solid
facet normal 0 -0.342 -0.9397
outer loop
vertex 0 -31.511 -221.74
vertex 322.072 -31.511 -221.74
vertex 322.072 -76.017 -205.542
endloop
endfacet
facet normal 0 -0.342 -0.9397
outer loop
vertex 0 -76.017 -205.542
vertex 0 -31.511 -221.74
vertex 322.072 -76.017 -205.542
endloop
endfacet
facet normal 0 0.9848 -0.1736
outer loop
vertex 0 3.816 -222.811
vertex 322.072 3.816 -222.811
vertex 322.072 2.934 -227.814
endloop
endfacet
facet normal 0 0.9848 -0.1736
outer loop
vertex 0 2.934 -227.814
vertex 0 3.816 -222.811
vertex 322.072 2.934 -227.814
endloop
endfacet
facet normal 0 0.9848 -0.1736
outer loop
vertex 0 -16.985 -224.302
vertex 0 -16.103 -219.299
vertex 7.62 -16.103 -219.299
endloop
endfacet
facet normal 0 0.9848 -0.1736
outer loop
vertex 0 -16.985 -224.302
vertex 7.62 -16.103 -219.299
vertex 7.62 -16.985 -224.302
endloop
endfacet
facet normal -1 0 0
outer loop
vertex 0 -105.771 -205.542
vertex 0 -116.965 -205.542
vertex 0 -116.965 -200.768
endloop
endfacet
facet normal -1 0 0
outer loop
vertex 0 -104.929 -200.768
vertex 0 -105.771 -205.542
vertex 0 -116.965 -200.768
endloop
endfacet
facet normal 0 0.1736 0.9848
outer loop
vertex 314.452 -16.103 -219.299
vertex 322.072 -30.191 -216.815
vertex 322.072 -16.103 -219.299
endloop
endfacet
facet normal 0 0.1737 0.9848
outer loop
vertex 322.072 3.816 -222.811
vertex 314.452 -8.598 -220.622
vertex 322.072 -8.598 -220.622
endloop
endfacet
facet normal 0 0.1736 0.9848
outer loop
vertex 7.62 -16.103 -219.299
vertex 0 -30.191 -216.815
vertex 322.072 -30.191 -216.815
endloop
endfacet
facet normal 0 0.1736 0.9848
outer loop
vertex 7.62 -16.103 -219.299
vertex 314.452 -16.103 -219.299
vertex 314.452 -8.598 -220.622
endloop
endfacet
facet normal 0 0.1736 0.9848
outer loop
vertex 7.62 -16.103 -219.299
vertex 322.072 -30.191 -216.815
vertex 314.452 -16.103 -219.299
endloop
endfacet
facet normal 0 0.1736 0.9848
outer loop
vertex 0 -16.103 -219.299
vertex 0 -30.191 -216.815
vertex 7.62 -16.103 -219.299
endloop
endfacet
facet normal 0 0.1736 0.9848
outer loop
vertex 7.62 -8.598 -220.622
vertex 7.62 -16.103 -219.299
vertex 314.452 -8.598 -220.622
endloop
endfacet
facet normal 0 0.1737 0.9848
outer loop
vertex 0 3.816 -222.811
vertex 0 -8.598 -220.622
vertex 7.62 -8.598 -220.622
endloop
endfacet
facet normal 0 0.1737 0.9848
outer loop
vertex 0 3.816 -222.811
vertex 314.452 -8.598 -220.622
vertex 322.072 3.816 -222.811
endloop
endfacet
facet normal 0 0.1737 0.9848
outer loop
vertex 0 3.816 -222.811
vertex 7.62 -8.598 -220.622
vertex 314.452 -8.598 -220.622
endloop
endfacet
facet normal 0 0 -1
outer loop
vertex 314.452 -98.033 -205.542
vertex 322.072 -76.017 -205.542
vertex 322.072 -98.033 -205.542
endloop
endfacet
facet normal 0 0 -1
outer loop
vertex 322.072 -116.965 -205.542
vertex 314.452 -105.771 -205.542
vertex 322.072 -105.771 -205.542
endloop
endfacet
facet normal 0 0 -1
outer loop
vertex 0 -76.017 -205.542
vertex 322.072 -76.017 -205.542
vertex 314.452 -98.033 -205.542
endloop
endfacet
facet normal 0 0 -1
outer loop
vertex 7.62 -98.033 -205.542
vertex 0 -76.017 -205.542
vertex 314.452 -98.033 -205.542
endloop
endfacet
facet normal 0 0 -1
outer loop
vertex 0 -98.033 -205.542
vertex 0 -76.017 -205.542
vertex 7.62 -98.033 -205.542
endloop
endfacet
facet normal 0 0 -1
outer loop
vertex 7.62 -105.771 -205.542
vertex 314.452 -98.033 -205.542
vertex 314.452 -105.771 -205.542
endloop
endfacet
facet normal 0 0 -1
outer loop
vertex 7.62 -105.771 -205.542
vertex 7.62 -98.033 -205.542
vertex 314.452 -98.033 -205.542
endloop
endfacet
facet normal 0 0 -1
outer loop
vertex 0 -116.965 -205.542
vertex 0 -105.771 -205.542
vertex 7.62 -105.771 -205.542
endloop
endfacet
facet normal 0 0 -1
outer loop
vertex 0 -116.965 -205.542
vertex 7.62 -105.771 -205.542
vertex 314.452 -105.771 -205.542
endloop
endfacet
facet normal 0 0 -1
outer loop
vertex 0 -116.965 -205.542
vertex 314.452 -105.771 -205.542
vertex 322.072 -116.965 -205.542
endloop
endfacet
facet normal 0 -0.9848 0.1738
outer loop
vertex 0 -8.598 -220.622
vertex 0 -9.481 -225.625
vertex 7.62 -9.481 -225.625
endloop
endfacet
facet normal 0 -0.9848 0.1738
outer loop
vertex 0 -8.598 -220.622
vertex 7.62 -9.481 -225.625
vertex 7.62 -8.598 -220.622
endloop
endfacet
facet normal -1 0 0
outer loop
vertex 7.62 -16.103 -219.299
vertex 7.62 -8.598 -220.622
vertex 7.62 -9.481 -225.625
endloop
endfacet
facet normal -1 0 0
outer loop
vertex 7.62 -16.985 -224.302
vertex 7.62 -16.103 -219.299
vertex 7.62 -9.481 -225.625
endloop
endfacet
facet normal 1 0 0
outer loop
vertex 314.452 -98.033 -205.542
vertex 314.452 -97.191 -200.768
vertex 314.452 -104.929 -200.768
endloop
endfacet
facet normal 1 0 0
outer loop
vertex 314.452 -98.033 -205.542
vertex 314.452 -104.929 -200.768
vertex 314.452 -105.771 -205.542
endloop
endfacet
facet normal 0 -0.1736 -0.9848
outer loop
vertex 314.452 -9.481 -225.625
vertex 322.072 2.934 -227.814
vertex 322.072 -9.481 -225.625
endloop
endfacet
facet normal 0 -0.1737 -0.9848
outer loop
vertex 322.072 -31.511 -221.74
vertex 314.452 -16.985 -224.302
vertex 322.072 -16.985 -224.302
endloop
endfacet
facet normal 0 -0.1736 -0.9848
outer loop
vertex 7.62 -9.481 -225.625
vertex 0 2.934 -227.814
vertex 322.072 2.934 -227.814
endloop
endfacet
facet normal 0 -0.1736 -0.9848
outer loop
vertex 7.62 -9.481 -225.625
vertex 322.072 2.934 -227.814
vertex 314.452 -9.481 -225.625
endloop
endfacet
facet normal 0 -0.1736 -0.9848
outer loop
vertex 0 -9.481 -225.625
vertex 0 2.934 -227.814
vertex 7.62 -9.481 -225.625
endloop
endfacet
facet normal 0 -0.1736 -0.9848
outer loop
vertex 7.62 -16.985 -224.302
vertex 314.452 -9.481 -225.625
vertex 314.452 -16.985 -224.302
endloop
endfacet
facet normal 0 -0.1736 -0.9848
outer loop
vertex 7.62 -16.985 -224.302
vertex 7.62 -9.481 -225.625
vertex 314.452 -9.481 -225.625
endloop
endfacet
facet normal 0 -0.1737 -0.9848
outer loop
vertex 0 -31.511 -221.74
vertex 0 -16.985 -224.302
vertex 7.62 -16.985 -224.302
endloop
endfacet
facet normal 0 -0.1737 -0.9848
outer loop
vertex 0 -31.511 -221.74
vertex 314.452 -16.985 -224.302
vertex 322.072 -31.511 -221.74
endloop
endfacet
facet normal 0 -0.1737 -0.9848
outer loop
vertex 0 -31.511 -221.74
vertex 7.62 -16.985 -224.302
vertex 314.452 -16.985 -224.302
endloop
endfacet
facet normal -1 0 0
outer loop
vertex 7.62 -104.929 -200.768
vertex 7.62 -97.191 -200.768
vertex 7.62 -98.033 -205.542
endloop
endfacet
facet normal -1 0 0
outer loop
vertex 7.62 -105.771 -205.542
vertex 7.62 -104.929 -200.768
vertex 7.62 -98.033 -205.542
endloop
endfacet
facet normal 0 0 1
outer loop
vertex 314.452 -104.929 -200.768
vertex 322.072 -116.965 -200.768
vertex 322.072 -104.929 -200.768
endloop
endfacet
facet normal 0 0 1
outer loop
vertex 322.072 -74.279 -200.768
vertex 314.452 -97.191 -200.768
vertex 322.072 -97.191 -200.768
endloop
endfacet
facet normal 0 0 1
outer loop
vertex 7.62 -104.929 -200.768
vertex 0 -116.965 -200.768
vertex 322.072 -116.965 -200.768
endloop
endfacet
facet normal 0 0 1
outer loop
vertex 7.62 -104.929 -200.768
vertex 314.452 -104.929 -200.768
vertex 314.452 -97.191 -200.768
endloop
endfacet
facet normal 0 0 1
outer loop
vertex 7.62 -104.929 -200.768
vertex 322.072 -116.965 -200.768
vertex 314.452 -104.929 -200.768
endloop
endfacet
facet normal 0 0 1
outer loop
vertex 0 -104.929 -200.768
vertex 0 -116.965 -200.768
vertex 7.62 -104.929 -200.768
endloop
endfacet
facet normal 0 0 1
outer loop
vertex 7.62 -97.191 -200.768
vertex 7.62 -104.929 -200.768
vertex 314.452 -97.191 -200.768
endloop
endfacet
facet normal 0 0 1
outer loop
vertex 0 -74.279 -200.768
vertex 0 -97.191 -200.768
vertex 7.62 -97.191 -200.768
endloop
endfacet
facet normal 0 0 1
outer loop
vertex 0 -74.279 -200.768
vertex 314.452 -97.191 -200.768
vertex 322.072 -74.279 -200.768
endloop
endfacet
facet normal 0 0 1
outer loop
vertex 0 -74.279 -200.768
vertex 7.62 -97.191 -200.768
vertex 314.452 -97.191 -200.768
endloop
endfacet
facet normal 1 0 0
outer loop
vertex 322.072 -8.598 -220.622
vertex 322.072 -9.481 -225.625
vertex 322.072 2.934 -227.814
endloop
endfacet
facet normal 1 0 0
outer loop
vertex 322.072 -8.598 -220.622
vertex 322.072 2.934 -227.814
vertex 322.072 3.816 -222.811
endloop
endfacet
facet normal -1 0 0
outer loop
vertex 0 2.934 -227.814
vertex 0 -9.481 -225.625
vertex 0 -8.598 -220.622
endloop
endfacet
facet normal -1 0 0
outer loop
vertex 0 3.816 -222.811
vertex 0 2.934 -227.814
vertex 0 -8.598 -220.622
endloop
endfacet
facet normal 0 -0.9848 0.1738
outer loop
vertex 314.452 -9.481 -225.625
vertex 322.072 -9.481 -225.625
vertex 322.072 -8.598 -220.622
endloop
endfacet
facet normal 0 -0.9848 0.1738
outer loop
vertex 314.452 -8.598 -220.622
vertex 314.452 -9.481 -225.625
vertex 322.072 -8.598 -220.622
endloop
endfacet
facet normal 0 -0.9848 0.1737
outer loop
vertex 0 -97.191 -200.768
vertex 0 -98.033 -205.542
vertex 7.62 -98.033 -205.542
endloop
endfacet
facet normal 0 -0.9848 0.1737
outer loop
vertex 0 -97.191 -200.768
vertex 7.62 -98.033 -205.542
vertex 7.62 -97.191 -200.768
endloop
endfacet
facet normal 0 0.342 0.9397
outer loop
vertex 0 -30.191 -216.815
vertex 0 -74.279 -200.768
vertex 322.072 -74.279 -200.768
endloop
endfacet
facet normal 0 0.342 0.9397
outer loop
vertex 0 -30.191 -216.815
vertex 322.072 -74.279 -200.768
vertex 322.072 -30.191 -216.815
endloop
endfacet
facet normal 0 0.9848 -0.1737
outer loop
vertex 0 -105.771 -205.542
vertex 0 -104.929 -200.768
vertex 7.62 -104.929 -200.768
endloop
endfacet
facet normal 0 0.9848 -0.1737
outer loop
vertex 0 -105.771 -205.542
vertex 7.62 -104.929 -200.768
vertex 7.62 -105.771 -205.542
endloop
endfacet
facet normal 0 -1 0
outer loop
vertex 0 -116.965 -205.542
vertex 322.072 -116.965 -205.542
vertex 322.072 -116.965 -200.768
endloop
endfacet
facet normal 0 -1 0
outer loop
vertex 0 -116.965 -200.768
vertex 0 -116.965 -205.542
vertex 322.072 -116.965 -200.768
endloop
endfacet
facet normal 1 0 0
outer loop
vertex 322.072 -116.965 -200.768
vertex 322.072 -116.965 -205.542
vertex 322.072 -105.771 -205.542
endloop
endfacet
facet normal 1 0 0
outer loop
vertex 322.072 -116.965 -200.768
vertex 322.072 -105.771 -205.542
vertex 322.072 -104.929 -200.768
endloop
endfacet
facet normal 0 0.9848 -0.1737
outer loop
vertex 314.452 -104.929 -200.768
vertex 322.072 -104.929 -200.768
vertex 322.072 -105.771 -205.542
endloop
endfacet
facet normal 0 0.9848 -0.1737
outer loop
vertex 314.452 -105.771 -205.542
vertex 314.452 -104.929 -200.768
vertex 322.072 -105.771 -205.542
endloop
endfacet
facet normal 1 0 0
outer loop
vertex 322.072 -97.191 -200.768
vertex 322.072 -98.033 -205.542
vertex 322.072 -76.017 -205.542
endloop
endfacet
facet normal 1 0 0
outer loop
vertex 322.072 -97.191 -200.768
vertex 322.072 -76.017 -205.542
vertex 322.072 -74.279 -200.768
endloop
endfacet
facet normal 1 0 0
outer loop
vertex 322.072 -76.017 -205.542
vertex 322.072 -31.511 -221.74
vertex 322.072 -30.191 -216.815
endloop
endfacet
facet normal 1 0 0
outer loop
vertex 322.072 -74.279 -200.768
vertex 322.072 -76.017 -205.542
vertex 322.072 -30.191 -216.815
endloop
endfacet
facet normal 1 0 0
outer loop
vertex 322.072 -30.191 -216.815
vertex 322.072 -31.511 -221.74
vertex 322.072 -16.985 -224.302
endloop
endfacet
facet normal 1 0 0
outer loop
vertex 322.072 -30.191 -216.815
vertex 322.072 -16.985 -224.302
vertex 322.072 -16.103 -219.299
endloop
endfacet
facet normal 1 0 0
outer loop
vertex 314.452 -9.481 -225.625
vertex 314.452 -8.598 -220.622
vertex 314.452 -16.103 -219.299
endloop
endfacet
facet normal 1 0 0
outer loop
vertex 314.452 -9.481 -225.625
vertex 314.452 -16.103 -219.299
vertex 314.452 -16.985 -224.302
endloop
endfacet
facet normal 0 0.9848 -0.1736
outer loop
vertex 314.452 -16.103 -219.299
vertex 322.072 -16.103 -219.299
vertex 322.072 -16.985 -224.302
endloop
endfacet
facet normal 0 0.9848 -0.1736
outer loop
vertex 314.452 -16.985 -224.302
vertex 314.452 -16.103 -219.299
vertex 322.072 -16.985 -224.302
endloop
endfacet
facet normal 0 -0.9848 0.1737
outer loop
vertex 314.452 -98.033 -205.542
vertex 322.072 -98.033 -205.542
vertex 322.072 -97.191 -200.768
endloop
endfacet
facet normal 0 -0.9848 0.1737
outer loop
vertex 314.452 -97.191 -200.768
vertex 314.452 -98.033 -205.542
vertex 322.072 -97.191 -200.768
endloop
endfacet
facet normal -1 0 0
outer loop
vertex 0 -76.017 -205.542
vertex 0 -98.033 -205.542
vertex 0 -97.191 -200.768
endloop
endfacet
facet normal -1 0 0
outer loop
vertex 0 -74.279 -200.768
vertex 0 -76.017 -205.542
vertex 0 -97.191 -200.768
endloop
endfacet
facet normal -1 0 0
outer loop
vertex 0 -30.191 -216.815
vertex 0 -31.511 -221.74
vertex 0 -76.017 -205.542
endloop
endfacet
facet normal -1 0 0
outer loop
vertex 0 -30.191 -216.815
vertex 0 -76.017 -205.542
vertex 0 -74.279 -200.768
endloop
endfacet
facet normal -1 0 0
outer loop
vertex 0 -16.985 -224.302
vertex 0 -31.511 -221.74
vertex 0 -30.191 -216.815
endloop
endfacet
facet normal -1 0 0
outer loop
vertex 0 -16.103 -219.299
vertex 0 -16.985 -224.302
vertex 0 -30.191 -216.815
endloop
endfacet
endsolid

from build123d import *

# Parameters (mm, degrees)
BOSS_EXTRUDE1_DEPTH = 322.072
CUT_EXTRUDE7_DEPTH  = 7.62
CUT_EXTRUDE8_DEPTH  = 7.62


with BuildPart() as part:
    # Sketch1 → Boss-Extrude1 (new body)
    with BuildSketch(Plane(origin=(0, 0, 0), x_dir=(0, 0, -1), z_dir=(1, 0, 0))):
        Polygon((222.810908306, 3.815774726), (227.813731692, 2.933641983), (221.740192501, -31.511110409), (205.541500449, -76.016651046), (205.541500449, -116.964716492), (200.767861936, -116.964716492), (200.767861936, -74.279188718), (216.814545731, -30.191287334), align=None)
    extrude(amount=BOSS_EXTRUDE1_DEPTH)

    # Sketch9 → Cut-Extrude7 (cut)
    with BuildSketch(Plane.ZY):
        Polygon((-228.475043657, -9.983148353), (-213.466573501, -7.336750125), (-212.143374387, -14.840985203), (-227.151844543, -17.487383431), align=None)
        Polygon((-209.00723387, -98.644141931), (-193.998763714, -95.997743703), (-193.998763714, -103.735294485), (-207.684034756, -106.148377008), align=None)
    extrude(amount=-CUT_EXTRUDE7_DEPTH, mode=Mode.SUBTRACT)

    # Sketch10 → Cut-Extrude8 (cut)
    with BuildSketch(Plane(origin=(322.072, 0, 0), x_dir=(0, 0, -1), z_dir=(1, 0, 0))):
        Polygon((228.475043657, -9.983148353), (213.466573501, -7.336750125), (212.143374387, -14.840985203), (227.151844543, -17.487383431), align=None)
        Polygon((193.998763714, -103.735294485), (207.684034756, -106.148377008), (209.00723387, -98.644141931), (193.998763714, -95.997743703), align=None)
    extrude(amount=-CUT_EXTRUDE8_DEPTH, mode=Mode.SUBTRACT)


solid = part.part
